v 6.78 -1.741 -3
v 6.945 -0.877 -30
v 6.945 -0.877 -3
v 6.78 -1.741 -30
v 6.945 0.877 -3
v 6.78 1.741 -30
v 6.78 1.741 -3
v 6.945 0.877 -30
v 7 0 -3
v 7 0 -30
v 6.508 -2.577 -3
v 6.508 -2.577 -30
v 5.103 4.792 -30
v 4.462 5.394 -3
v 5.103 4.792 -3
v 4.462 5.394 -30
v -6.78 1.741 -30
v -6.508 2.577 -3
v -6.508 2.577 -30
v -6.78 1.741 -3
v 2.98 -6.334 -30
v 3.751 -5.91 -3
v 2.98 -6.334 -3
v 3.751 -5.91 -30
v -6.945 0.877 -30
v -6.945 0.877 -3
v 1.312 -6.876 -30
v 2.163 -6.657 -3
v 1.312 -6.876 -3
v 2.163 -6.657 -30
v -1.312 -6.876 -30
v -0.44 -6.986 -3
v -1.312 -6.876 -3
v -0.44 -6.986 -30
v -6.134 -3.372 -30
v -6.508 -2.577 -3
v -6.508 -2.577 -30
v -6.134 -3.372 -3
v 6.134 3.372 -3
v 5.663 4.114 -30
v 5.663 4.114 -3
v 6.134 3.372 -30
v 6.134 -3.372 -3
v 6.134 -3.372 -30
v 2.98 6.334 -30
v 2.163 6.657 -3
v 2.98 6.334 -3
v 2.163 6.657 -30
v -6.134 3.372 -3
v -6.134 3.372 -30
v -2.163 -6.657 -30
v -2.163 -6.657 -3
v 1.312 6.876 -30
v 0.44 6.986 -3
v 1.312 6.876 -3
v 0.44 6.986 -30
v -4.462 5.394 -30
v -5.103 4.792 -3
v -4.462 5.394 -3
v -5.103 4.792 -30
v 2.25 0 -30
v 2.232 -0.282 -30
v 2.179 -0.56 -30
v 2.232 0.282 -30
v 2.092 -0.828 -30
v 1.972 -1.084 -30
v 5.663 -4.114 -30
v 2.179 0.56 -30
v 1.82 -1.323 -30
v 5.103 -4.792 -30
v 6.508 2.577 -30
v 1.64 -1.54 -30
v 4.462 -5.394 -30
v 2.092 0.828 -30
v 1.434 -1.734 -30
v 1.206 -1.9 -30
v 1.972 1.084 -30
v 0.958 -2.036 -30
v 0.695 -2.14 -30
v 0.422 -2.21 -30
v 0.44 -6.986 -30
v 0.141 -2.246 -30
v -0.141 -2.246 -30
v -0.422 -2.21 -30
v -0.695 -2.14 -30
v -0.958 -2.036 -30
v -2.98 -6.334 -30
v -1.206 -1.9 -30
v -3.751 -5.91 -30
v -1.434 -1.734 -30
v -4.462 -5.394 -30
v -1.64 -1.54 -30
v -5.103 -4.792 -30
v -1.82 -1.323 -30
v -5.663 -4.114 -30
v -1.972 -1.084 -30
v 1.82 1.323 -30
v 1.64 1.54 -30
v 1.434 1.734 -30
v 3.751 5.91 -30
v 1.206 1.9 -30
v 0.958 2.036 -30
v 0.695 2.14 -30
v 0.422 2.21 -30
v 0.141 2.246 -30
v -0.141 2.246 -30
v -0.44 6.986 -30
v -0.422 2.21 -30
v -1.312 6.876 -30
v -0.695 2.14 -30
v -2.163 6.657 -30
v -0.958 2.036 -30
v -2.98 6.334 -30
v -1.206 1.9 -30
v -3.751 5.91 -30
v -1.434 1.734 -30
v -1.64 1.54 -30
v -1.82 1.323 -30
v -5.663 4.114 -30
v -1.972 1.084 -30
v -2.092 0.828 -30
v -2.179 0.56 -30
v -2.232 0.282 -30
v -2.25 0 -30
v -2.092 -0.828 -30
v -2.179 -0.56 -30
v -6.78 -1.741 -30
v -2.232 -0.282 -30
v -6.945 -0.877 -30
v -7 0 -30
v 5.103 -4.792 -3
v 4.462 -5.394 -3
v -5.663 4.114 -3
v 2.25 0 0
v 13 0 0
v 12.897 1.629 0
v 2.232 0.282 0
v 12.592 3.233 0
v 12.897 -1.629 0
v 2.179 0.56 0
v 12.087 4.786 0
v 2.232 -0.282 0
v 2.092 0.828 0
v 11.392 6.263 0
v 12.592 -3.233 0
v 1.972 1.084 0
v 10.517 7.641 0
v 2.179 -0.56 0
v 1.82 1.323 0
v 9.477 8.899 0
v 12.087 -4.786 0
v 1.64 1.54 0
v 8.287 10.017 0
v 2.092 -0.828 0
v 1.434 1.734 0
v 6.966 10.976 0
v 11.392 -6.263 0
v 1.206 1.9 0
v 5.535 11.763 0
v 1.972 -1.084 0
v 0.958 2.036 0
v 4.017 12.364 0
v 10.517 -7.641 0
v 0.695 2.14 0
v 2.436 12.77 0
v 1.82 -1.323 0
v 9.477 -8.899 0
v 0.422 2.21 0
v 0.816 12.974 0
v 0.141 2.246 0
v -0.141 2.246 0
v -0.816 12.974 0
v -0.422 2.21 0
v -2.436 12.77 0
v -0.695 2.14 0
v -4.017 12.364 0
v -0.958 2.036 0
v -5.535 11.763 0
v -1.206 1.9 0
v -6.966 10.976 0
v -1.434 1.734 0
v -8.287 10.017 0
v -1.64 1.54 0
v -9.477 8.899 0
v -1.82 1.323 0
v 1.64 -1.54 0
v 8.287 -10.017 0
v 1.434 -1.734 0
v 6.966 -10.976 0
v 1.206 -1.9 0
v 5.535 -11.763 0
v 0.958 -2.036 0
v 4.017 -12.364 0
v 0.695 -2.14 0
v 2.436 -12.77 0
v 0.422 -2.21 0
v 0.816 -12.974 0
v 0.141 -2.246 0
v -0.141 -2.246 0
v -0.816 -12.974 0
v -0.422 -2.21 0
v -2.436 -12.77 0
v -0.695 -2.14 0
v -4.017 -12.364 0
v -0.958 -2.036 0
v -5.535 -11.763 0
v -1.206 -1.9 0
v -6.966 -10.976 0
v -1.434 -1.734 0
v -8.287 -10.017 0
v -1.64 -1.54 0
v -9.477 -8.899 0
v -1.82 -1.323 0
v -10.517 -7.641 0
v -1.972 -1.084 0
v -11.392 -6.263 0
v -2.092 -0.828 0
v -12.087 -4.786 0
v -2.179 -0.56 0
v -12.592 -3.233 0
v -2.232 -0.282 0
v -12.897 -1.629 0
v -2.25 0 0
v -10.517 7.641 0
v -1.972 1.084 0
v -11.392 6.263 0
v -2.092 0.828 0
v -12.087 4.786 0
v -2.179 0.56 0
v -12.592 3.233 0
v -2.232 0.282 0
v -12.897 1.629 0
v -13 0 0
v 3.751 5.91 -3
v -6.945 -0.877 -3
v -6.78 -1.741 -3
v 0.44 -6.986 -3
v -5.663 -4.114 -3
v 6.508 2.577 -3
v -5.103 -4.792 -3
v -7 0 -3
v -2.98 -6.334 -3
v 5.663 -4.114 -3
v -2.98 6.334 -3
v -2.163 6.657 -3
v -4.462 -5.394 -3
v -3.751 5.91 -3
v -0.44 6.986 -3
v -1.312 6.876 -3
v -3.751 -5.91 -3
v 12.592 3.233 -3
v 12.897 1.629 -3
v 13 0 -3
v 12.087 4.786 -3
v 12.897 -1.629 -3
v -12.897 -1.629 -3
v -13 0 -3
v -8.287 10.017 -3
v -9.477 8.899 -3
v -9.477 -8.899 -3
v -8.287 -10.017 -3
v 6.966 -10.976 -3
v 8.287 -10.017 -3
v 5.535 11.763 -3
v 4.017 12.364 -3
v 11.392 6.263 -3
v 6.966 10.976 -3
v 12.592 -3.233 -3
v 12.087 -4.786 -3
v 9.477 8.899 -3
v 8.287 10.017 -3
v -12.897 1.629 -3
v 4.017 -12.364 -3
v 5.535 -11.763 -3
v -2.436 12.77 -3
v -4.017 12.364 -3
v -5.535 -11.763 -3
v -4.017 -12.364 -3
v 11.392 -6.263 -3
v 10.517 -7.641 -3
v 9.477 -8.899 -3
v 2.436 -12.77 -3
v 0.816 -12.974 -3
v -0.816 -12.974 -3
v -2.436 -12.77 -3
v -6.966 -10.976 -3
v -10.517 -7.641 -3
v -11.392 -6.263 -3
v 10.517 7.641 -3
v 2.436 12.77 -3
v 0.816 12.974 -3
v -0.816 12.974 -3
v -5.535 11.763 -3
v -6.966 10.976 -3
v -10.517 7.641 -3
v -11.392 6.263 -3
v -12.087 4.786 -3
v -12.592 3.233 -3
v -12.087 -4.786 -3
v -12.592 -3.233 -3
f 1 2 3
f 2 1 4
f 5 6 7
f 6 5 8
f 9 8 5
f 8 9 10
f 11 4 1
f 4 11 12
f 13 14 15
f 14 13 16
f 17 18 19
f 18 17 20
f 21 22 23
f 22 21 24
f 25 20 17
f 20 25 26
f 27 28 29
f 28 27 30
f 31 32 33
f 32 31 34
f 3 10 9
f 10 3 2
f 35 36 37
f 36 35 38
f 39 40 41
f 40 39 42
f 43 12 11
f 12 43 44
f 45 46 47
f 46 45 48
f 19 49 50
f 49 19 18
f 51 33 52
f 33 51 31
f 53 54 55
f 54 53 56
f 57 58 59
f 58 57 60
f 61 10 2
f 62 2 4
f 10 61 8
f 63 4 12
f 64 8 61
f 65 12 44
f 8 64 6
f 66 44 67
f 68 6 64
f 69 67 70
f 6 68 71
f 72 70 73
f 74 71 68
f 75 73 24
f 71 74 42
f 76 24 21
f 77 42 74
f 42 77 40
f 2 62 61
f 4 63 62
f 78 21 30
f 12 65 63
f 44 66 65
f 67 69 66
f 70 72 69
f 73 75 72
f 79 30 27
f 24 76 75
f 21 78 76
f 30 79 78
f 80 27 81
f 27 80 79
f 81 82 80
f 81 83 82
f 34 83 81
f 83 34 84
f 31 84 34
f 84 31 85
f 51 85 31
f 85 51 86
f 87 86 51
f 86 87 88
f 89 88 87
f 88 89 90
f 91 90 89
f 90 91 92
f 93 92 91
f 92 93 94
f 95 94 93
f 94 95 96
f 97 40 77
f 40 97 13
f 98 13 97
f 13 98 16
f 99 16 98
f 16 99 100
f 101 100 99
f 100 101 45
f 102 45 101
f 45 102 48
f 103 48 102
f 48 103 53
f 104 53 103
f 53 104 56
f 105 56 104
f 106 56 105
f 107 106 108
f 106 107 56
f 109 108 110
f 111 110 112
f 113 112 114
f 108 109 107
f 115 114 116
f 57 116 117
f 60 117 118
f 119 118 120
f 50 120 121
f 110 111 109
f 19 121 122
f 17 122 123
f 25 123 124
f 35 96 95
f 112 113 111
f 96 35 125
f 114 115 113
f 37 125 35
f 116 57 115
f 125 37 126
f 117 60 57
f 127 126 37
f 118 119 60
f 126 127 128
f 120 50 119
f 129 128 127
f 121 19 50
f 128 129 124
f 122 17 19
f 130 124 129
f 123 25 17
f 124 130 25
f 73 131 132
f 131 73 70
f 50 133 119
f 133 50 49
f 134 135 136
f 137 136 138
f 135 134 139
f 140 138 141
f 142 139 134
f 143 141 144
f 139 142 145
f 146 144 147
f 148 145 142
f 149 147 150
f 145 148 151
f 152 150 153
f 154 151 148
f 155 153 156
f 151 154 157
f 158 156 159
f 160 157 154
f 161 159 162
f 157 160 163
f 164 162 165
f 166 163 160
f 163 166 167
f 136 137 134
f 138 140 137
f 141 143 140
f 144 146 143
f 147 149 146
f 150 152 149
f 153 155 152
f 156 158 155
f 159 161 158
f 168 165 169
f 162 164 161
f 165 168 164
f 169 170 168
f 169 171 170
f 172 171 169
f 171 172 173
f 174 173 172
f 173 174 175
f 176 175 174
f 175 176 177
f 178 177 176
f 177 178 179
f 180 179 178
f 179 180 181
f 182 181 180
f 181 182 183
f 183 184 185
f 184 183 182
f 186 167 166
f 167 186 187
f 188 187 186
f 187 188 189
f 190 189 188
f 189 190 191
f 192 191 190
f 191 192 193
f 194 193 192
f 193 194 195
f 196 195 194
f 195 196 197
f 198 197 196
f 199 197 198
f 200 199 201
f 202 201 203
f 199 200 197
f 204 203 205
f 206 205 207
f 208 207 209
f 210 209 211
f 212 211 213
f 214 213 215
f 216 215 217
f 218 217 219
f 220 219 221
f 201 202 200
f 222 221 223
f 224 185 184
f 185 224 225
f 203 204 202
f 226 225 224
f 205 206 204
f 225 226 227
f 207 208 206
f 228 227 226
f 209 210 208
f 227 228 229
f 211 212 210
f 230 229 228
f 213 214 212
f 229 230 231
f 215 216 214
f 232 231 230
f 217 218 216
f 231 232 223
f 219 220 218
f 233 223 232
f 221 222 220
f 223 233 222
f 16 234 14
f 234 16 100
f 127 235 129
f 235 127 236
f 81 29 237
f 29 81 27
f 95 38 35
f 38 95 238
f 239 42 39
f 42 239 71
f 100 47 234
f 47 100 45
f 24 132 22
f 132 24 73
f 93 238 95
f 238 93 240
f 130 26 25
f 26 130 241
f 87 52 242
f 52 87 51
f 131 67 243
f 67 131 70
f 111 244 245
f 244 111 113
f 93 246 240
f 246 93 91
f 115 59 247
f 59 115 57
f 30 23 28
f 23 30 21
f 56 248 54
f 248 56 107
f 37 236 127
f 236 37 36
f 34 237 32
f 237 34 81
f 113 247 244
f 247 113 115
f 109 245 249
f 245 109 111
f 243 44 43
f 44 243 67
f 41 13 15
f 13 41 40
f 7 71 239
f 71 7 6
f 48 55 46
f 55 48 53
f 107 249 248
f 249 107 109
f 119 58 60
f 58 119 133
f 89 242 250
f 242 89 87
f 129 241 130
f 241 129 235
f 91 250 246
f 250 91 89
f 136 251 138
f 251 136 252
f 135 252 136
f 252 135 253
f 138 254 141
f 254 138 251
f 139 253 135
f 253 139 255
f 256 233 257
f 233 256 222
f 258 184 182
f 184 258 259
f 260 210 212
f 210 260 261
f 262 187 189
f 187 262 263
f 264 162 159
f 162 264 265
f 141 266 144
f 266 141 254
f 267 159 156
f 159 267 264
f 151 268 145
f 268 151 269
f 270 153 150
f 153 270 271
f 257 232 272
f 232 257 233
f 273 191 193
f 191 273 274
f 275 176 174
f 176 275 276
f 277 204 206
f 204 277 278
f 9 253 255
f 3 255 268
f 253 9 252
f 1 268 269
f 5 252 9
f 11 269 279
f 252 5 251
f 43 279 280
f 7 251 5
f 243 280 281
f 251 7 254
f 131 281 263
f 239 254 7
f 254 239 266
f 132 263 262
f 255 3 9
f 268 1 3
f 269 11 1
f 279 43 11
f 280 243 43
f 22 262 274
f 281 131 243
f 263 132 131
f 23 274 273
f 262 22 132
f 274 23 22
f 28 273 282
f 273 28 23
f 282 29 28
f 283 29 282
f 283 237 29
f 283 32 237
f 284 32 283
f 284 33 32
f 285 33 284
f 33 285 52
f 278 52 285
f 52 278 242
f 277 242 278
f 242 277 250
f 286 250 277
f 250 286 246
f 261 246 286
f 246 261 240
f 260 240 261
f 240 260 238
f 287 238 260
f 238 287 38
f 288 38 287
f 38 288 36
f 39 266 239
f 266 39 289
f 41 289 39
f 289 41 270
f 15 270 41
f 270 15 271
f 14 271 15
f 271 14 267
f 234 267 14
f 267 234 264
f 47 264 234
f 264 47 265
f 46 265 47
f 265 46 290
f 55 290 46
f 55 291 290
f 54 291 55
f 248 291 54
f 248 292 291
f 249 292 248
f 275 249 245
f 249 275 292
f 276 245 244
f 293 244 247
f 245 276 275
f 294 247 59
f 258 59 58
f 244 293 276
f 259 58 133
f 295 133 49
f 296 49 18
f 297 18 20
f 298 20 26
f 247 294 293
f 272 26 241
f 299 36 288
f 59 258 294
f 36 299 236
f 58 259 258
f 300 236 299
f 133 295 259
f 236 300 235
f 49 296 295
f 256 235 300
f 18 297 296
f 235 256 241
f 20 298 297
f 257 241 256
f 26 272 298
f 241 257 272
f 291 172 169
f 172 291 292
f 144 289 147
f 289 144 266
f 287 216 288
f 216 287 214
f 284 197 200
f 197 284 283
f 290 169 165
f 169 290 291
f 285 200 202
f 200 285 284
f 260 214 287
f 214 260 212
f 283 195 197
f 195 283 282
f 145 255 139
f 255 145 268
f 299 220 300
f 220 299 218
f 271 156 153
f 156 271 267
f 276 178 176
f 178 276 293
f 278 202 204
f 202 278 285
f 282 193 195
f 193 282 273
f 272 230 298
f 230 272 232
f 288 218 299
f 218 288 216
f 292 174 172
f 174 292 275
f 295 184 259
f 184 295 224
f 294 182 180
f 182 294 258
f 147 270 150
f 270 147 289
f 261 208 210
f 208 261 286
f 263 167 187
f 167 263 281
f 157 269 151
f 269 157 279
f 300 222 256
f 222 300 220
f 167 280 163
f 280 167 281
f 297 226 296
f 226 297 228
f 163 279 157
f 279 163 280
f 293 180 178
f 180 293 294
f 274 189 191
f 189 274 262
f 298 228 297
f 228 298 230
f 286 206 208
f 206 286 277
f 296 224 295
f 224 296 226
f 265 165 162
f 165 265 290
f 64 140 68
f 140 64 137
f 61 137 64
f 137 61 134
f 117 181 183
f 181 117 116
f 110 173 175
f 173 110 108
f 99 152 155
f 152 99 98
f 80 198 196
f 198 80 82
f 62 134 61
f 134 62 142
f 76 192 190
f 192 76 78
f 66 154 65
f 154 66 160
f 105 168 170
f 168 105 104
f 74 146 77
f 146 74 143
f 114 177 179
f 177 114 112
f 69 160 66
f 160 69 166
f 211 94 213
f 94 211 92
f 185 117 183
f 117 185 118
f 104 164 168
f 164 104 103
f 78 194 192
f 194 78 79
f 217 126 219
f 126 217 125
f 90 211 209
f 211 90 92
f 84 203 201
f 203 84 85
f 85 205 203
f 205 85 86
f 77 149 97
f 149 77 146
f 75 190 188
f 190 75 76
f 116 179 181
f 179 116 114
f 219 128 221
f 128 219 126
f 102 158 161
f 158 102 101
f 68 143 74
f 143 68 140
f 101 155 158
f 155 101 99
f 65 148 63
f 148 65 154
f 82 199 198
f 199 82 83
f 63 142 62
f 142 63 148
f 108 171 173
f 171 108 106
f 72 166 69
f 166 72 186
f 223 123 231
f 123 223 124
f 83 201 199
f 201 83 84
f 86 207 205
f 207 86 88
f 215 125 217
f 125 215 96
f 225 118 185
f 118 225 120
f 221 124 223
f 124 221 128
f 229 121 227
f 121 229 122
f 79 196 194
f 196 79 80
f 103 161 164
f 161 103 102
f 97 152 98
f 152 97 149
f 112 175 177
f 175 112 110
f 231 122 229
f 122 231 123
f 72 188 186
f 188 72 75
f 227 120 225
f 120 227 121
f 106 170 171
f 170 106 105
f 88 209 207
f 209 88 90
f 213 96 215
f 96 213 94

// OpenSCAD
$fn = 50;


difference() {
	union() {
		translate(v = [0, 0, -30.0000000000]) {
			cylinder(h = 30, r = 7.0000000000);
		}
		translate(v = [0, 0, -3.0000000000]) {
			cylinder(h = 3, r = 13.0000000000);
		}
	}
	union() {
		#translate(v = [0, 0, -30]) {
			cylinder(h = 30, r = 2.2500000000);
		}
	}
}
